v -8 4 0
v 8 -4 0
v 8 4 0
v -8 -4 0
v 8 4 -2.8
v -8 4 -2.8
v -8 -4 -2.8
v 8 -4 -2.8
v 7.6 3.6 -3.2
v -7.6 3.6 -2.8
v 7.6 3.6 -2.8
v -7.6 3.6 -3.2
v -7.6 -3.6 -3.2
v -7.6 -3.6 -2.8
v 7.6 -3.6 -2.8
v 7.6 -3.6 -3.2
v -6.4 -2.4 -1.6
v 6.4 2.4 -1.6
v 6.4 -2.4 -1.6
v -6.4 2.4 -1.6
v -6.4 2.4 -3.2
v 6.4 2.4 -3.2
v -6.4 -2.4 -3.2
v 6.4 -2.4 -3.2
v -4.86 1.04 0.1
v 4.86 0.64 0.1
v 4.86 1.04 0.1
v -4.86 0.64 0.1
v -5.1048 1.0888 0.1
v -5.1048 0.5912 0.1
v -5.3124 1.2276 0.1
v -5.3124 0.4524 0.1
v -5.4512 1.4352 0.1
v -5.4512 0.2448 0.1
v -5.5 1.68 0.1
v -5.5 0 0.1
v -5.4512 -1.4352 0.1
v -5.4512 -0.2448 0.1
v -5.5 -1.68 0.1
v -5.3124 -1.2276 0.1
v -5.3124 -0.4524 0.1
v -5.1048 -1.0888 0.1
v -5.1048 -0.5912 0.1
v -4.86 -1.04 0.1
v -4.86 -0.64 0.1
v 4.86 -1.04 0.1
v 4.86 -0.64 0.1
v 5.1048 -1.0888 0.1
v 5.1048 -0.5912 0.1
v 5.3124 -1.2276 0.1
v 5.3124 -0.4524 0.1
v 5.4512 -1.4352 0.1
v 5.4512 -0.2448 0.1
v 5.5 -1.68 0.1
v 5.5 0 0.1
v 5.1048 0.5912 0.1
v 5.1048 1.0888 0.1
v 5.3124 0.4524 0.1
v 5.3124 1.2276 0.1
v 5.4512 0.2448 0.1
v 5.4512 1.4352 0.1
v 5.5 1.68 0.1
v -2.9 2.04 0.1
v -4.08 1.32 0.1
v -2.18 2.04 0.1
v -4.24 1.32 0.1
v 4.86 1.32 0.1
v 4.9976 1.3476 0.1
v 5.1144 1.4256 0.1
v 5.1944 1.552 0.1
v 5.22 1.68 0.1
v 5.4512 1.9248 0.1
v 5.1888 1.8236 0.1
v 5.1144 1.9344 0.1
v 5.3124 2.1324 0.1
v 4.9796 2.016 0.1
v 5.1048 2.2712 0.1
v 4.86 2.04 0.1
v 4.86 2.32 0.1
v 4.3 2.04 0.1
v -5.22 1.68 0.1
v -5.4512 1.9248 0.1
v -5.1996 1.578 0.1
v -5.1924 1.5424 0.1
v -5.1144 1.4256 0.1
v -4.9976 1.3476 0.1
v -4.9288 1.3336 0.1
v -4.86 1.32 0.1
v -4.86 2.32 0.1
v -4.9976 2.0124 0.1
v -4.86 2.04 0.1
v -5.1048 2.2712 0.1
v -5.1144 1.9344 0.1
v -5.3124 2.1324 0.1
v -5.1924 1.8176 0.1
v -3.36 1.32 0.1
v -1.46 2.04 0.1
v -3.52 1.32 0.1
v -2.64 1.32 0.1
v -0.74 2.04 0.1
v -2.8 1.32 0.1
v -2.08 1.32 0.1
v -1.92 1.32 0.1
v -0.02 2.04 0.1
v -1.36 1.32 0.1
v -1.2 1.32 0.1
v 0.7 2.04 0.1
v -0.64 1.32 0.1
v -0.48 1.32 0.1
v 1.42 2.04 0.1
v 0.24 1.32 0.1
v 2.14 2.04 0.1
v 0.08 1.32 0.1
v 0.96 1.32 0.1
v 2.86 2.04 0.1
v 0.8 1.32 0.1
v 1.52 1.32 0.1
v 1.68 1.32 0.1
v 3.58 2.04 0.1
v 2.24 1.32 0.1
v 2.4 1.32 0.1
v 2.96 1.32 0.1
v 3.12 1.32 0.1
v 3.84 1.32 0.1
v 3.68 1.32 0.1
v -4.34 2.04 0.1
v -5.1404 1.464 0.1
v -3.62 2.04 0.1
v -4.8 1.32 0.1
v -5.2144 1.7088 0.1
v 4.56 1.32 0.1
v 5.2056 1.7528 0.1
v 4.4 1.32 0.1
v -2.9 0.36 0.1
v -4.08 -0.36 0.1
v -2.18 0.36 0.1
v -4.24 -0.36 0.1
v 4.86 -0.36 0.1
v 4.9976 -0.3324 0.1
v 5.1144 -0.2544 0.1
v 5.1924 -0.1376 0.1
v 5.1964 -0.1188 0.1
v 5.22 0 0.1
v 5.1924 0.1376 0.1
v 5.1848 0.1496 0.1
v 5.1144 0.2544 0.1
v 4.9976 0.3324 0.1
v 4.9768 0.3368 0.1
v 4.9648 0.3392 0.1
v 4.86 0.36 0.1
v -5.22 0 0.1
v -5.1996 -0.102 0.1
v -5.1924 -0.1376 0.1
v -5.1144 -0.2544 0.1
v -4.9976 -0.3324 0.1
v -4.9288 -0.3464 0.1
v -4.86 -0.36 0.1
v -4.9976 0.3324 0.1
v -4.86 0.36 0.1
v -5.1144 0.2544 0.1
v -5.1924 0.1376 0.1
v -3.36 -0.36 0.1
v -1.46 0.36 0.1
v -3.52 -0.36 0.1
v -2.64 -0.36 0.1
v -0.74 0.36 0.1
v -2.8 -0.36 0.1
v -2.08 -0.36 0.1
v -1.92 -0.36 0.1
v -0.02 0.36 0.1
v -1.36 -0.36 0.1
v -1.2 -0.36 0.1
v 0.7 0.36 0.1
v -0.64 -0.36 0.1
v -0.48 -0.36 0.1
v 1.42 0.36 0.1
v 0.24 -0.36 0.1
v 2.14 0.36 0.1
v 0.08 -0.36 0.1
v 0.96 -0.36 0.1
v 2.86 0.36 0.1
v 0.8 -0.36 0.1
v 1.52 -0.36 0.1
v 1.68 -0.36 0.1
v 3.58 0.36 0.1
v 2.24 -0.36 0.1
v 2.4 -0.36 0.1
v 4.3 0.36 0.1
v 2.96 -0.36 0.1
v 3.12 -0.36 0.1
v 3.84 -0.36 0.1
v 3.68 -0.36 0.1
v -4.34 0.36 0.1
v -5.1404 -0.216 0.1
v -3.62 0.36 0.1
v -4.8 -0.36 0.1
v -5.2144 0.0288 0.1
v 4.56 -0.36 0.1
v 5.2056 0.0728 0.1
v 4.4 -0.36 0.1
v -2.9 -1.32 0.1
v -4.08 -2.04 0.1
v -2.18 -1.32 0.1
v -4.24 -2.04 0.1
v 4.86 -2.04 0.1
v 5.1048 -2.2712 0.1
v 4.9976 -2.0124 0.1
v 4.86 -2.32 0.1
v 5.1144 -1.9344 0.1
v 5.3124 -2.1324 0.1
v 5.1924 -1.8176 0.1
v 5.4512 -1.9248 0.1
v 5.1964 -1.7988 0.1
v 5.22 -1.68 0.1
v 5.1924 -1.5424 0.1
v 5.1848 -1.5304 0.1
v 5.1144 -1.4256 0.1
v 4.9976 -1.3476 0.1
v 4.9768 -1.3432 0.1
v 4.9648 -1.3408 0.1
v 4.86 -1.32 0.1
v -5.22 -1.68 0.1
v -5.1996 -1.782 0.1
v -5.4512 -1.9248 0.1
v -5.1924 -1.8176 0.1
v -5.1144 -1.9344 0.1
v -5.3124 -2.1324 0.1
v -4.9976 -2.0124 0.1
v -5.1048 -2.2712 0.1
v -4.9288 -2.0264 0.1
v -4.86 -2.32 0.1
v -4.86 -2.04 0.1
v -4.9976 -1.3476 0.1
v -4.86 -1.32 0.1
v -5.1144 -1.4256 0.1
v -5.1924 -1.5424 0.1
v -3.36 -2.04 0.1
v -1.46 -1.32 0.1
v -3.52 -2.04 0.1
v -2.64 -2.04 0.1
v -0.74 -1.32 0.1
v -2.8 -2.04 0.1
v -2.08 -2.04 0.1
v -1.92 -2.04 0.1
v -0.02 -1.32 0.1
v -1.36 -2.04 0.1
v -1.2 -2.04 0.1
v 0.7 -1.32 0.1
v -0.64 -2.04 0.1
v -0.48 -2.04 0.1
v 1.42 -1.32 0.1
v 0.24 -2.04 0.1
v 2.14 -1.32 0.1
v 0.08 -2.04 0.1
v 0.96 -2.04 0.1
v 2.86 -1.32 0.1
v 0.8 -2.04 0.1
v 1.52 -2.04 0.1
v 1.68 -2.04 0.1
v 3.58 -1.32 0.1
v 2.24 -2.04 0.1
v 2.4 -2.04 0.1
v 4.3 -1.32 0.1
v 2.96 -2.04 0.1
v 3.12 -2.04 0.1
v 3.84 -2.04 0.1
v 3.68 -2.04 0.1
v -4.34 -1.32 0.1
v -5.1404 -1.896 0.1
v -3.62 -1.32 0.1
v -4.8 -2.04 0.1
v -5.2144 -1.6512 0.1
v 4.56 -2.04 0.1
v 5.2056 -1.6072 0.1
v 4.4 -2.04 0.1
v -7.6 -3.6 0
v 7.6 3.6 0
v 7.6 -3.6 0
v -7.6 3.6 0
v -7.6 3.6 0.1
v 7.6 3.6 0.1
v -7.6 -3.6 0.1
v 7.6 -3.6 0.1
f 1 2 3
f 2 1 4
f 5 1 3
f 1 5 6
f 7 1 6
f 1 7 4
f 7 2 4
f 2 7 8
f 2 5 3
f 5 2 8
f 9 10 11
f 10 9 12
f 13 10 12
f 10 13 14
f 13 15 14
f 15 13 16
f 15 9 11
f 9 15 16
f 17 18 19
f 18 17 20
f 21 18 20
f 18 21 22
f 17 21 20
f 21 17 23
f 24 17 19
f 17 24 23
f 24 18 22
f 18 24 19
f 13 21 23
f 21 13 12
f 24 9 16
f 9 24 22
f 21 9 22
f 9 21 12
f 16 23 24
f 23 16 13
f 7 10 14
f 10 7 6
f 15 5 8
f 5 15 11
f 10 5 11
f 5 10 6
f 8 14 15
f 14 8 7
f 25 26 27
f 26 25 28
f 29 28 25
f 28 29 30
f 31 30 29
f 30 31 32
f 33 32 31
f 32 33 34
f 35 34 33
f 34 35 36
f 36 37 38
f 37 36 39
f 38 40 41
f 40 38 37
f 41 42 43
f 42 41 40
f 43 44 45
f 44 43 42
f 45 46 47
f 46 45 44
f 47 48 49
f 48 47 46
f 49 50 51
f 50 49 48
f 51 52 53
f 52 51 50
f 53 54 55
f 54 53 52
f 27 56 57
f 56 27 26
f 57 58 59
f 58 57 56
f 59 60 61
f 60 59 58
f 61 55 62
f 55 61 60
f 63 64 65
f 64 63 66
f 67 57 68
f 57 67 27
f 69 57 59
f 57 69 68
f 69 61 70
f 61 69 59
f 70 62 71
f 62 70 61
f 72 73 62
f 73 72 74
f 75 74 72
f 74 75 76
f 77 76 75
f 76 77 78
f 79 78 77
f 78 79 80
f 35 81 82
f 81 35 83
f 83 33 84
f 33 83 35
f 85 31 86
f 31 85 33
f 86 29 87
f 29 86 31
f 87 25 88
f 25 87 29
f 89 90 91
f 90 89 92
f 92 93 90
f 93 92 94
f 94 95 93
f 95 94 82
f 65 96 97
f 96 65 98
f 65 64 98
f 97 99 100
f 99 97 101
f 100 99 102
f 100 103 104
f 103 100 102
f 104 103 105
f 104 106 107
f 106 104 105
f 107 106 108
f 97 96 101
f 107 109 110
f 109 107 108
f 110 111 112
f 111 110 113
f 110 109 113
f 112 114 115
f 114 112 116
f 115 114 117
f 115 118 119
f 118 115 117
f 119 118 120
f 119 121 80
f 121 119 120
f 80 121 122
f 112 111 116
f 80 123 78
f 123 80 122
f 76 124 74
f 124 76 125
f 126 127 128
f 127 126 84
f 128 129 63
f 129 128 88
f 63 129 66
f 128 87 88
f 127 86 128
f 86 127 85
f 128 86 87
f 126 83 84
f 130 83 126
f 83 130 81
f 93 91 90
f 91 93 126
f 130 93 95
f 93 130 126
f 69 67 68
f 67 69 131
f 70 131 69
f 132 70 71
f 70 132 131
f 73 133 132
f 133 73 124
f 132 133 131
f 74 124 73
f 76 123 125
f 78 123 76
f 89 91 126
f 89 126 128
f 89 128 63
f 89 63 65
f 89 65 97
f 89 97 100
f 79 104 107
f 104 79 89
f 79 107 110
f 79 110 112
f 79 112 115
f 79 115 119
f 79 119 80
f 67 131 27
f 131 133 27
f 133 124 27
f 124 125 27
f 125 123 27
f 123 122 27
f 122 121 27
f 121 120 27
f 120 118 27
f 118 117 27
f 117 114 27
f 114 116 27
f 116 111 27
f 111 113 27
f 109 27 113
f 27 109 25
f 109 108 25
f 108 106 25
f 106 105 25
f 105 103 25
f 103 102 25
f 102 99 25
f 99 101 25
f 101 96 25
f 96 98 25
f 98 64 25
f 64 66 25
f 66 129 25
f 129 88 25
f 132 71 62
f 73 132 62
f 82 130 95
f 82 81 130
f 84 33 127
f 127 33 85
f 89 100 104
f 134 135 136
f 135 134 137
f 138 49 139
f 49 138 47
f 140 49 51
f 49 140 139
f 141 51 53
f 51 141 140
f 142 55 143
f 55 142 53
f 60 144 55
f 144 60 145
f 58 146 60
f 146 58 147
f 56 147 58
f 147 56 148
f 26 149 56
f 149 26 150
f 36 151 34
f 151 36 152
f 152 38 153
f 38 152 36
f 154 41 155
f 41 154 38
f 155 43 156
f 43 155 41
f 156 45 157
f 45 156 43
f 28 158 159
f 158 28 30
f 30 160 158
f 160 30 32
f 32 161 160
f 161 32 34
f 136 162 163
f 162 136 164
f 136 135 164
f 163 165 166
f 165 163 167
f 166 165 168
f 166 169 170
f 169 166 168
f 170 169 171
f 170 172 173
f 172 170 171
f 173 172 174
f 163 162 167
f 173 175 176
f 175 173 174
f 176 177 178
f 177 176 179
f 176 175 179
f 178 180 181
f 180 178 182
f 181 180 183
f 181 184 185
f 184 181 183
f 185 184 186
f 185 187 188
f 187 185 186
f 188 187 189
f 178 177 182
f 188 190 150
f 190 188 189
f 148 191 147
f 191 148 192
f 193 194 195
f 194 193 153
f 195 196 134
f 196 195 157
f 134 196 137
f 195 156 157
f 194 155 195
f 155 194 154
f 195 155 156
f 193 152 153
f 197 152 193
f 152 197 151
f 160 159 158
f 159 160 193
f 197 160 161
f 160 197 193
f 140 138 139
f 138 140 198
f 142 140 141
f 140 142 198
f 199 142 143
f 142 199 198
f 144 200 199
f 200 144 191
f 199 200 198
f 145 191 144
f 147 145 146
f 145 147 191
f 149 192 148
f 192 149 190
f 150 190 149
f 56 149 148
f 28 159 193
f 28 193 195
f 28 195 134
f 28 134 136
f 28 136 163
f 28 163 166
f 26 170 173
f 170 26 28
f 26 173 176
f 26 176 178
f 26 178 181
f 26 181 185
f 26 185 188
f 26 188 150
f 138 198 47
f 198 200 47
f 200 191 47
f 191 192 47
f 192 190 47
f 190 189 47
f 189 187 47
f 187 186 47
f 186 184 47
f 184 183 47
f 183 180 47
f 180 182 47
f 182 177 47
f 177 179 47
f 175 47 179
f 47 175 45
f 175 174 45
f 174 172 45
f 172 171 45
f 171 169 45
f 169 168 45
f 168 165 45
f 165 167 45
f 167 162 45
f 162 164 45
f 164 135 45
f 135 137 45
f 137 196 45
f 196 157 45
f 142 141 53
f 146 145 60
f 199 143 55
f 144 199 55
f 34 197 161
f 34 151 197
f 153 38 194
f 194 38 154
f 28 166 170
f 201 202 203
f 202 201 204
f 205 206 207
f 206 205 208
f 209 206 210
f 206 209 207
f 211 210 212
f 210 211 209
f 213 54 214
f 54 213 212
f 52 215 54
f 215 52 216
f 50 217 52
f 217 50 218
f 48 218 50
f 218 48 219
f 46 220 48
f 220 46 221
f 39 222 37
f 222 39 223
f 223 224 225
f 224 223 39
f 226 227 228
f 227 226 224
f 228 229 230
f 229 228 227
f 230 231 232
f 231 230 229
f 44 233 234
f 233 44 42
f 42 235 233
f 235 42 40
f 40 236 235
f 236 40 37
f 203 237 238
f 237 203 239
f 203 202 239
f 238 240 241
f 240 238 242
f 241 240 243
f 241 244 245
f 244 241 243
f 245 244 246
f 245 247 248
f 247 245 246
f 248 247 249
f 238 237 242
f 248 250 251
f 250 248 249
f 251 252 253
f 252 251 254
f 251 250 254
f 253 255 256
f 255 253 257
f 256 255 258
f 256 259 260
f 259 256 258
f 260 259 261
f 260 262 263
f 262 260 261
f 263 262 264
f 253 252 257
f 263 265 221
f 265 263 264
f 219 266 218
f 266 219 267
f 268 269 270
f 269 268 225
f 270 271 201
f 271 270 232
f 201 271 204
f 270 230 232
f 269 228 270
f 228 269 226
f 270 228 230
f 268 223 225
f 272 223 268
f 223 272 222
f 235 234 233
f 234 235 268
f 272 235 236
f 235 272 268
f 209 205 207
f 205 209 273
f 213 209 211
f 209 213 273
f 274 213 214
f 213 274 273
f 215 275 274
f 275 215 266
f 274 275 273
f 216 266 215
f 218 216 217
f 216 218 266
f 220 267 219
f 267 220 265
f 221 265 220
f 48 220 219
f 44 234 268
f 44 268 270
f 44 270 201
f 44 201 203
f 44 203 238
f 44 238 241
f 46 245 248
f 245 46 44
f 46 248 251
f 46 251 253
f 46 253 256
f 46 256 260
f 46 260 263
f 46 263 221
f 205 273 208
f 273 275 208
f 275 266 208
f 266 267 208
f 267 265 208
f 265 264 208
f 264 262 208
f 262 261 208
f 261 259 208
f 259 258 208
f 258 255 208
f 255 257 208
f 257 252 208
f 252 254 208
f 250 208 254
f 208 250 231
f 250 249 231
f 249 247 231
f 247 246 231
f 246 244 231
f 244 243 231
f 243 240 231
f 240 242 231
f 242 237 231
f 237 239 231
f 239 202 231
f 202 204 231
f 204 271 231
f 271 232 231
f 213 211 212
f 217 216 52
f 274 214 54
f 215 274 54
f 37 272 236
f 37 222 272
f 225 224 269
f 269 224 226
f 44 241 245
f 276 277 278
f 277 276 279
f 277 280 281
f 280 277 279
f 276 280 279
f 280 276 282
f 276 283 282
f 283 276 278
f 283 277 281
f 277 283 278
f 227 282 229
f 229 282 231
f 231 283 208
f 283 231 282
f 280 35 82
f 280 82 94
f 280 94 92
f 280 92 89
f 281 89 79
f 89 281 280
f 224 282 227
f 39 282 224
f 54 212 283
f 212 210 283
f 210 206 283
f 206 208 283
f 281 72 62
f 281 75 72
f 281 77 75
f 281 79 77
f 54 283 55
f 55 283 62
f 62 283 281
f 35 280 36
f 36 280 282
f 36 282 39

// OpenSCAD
// file: ../p/box5.scad
use <../lib.scad>
function ldraw_lib__box5() = [
// 0 Box with 5 Faces and All Edges
// 0 Name: box5.dat
// 0 Author: James Jessiman
// 0 !LDRAW_ORG Primitive UPDATE 2012-01
// 0 !LICENSE Licensed under CC BY 4.0 : see CAreadme.txt
// 
// 0 BFC CERTIFY CCW
  [0,"BFC","CERTIFY"],
  [0,"BFC","CCW"],
// 
// 0 !HISTORY 2002-04-03 [sbliss] Modified for BFC compliance
// 0 !HISTORY 2002-04-25 [PTadmin] Official Update 2002-02
// 0 !HISTORY 2007-06-24 [PTadmin] Header formatted for Contributor Agreement
// 0 !HISTORY 2008-07-01 [PTadmin] Official Update 2008-01
// 0 !HISTORY 2012-02-16 [Philo] Changed to CCW
// 0 !HISTORY 2012-03-30 [PTadmin] Official Update 2012-01
// 
// 
// 2 24 1 1 1 -1 1 1
  [2,24,1,1,1,-1,1,1],
// 2 24 -1 1 1 -1 1 -1
  [2,24,-1,1,1,-1,1,-1],
// 2 24 -1 1 -1 1 1 -1
  [2,24,-1,1,-1,1,1,-1],
// 2 24 1 1 -1 1 1 1
  [2,24,1,1,-1,1,1,1],
// 2 24 1 0 1 -1 0 1
  [2,24,1,0,1,-1,0,1],
// 2 24 -1 0 1 -1 0 -1
  [2,24,-1,0,1,-1,0,-1],
// 2 24 -1 0 -1 1 0 -1
  [2,24,-1,0,-1,1,0,-1],
// 2 24 1 0 -1 1 0 1
  [2,24,1,0,-1,1,0,1],
// 2 24 1 0 1 1 1 1
  [2,24,1,0,1,1,1,1],
// 2 24 -1 0 1 -1 1 1
  [2,24,-1,0,1,-1,1,1],
// 2 24 1 0 -1 1 1 -1
  [2,24,1,0,-1,1,1,-1],
// 2 24 -1 0 -1 -1 1 -1
  [2,24,-1,0,-1,-1,1,-1],
// 4 16 -1 1 1 1 1 1 1 1 -1 -1 1 -1
  [4,16,-1,1,1,1,1,1,1,1,-1,-1,1,-1],
// 4 16 -1 1 1 -1 0 1 1 0 1 1 1 1
  [4,16,-1,1,1,-1,0,1,1,0,1,1,1,1],
// 4 16 -1 1 -1 -1 0 -1 -1 0 1 -1 1 1
  [4,16,-1,1,-1,-1,0,-1,-1,0,1,-1,1,1],
// 4 16 1 1 -1 1 0 -1 -1 0 -1 -1 1 -1
  [4,16,1,1,-1,1,0,-1,-1,0,-1,-1,1,-1],
// 4 16 1 1 1 1 0 1 1 0 -1 1 1 -1
  [4,16,1,1,1,1,0,1,1,0,-1,1,1,-1],
];
module ldraw_lib__box5(step=0, col=false, unit=2/5, alt=false, line=0.2, solid=!$preview)
    makepoly(ldraw_lib__box5(), step=step, col=col, unit=unit, alt=alt, line=line, solid=solid);
ldraw_lib__box5(line=0.2);
// file: ../p/box4.scad
use <../lib.scad>
function ldraw_lib__box4() = [
// 0 Box with 4 Faces (2 Parallel Pairs) and All Edges
// 0 Name: box4.dat
// 0 Author: James Jessiman
// 0 !LDRAW_ORG Primitive UPDATE 2012-01
// 0 !LICENSE Licensed under CC BY 4.0 : see CAreadme.txt
// 
// 0 BFC CERTIFY CCW
  [0,"BFC","CERTIFY"],
  [0,"BFC","CCW"],
// 
// 0 !HISTORY 2002-04-03 [sbliss] Modified for BFC compliance
// 0 !HISTORY 2002-04-25 [PTadmin] Official Update 2002-02
// 0 !HISTORY 2007-06-24 [PTadmin] Header formatted for Contributor Agreement
// 0 !HISTORY 2008-07-01 [PTadmin] Official Update 2008-01
// 0 !HISTORY 2012-02-16 [Philo] Changed to CCW
// 0 !HISTORY 2012-03-30 [PTadmin] Official Update 2012-01
// 
// 
// 2 24 1 1 1 -1 1 1
  [2,24,1,1,1,-1,1,1],
// 2 24 -1 1 1 -1 1 -1
  [2,24,-1,1,1,-1,1,-1],
// 2 24 -1 1 -1 1 1 -1
  [2,24,-1,1,-1,1,1,-1],
// 2 24 1 1 -1 1 1 1
  [2,24,1,1,-1,1,1,1],
// 2 24 1 0 1 -1 0 1
  [2,24,1,0,1,-1,0,1],
// 2 24 -1 0 1 -1 0 -1
  [2,24,-1,0,1,-1,0,-1],
// 2 24 -1 0 -1 1 0 -1
  [2,24,-1,0,-1,1,0,-1],
// 2 24 1 0 -1 1 0 1
  [2,24,1,0,-1,1,0,1],
// 2 24 1 0 1 1 1 1
  [2,24,1,0,1,1,1,1],
// 2 24 -1 0 1 -1 1 1
  [2,24,-1,0,1,-1,1,1],
// 2 24 1 0 -1 1 1 -1
  [2,24,1,0,-1,1,1,-1],
// 2 24 -1 0 -1 -1 1 -1
  [2,24,-1,0,-1,-1,1,-1],
// 4 16 -1 1 1 -1 0 1 1 0 1 1 1 1
  [4,16,-1,1,1,-1,0,1,1,0,1,1,1,1],
// 4 16 -1 1 -1 -1 0 -1 -1 0 1 -1 1 1
  [4,16,-1,1,-1,-1,0,-1,-1,0,1,-1,1,1],
// 4 16 1 1 -1 1 0 -1 -1 0 -1 -1 1 -1
  [4,16,1,1,-1,1,0,-1,-1,0,-1,-1,1,-1],
// 4 16 1 1 1 1 0 1 1 0 -1 1 1 -1
  [4,16,1,1,1,1,0,1,1,0,-1,1,1,-1],
];
module ldraw_lib__box4(step=0, col=false, unit=2/5, alt=false, line=0.2, solid=!$preview)
    makepoly(ldraw_lib__box4(), step=step, col=col, unit=unit, alt=alt, line=line, solid=solid);
ldraw_lib__box4(line=0.2);
// file: ../p/box5-12.scad
use <../lib.scad>
function ldraw_lib__box5_12() = [
// 0 Box with 5 Faces without Any Edges
// 0 Name: box5-12.dat
// 0 Author: Chris Dee [cwdee]
// 0 !LDRAW_ORG Primitive UPDATE 2009-02
// 0 !LICENSE Licensed under CC BY 4.0 : see CAreadme.txt
// 
// 0 BFC CERTIFY CCW
  [0,"BFC","CERTIFY"],
  [0,"BFC","CCW"],
// 
// 0 !HISTORY 2009-09-03 [PTadmin] Official Update 2009-02
// 
// 
// 4 16 1 1 1 1 1 -1 -1 1 -1 -1 1 1
  [4,16,1,1,1,1,1,-1,-1,1,-1,-1,1,1],
// 4 16 -1 0 1 1 0 1 1 1 1 -1 1 1
  [4,16,-1,0,1,1,0,1,1,1,1,-1,1,1],
// 4 16 -1 0 -1 -1 0 1 -1 1 1 -1 1 -1
  [4,16,-1,0,-1,-1,0,1,-1,1,1,-1,1,-1],
// 4 16 1 0 -1 -1 0 -1 -1 1 -1 1 1 -1
  [4,16,1,0,-1,-1,0,-1,-1,1,-1,1,1,-1],
// 4 16 1 0 1 1 0 -1 1 1 -1 1 1 1
  [4,16,1,0,1,1,0,-1,1,1,-1,1,1,1],
// 0
];
module ldraw_lib__box5_12(step=0, col=false, unit=2/5, alt=false, line=0.2, solid=!$preview)
    makepoly(ldraw_lib__box5_12(), step=step, col=col, unit=unit, alt=alt, line=line, solid=solid);
ldraw_lib__box5_12(line=0.2);
// file: s/3069bs01.scad
use <../../lib.scad>
use <../../p/box4.scad>
use <../../p/box5.scad>
function ldraw_lib__s__3069bs01() = [
// 0 ~Tile  1 x  2 with Groove without Top Face
// 0 Name: s\3069bs01.dat
// 0 Author: Santeri Piippo [arezey]
// 0 !LDRAW_ORG Subpart UPDATE 2010-02
// 0 !LICENSE Licensed under CC BY 4.0 : see CAreadme.txt
// 
// 0 BFC CERTIFY CCW
  [0,"BFC","CERTIFY"],
  [0,"BFC","CCW"],
// 
// 0 !HISTORY 2010-07-05 [PTadmin] Official Update 2010-02
// 
// 
// 1 16 0 0 0 20 0 0 0 7 0 0 0 10 box4.dat
  [1,16,0,0,0,20,0,0,0,7,0,0,0,10, ldraw_lib__box4()],
// 1 16 0 7 0 19 0 0 0 1 0 0 0 9 box4.dat
  [1,16,0,7,0,19,0,0,0,1,0,0,0,9, ldraw_lib__box4()],
// 0 BFC INVERTNEXT
  [0,"BFC","INVERTNEXT"],
// 1 16 0 8 0 16 0 0 0 -4 0 0 0 6 box5.dat
  [1,16,0,8,0,16,0,0,0,-4,0,0,0,6, ldraw_lib__box5()],
// 4 16 -19 8 9 -16 8 6 -16 8 -6 -19 8 -9
  [4,16,-19,8,9,-16,8,6,-16,8,-6,-19,8,-9],
// 4 16 19 8 -9 16 8 -6 16 8 6 19 8 9
  [4,16,19,8,-9,16,8,-6,16,8,6,19,8,9],
// 4 16 19 8 9 16 8 6 -16 8 6 -19 8 9
  [4,16,19,8,9,16,8,6,-16,8,6,-19,8,9],
// 4 16 -19 8 -9 -16 8 -6 16 8 -6 19 8 -9
  [4,16,-19,8,-9,-16,8,-6,16,8,-6,19,8,-9],
// 4 16 -20 7 10 -19 7 9 -19 7 -9 -20 7 -10
  [4,16,-20,7,10,-19,7,9,-19,7,-9,-20,7,-10],
// 4 16 20 7 -10 19 7 -9 19 7 9 20 7 10
  [4,16,20,7,-10,19,7,-9,19,7,9,20,7,10],
// 4 16 20 7 10 19 7 9 -19 7 9 -20 7 10
  [4,16,20,7,10,19,7,9,-19,7,9,-20,7,10],
// 4 16 -20 7 -10 -19 7 -9 19 7 -9 20 7 -10
  [4,16,-20,7,-10,-19,7,-9,19,7,-9,20,7,-10],
// 0 //
];
module ldraw_lib__s__3069bs01(step=0, col=false, unit=2/5, alt=false, line=0.2, solid=!$preview)
    makepoly(ldraw_lib__s__3069bs01(), step=step, col=col, unit=unit, alt=alt, line=line, solid=solid);
ldraw_lib__s__3069bs01(line=0.2);
// file: 4263304f.scad
use <../lib.scad>
use <../p/box5-12.scad>
use <s/4188571cs01.scad>
function ldraw_lib__4263304f() = [
// 0 Sticker  0.9 x  1.9 with Horizontal Grille
// 0 Name: 4263304f.dat
// 0 Author: Gerald Lasser [GeraldLasser]
// 0 !LDRAW_ORG Part UPDATE 2023-04
// 0 !LICENSE Licensed under CC BY 4.0 : see CAreadme.txt
// 
// 0 BFC CERTIFY CCW
  [0,"BFC","CERTIFY"],
  [0,"BFC","CCW"],
// 
// 0 !KEYWORDS BNSF, Bricklink 10133stk01, Brickowl 912944, Rebrickable 53049
// 0 !KEYWORDS Sante Fe, Set 10133
// 
// 0 !HISTORY 2023-08-25 [OrionP] Official Update 2023-04
// 
// 
// 1 16 0 -.25 0 1 0 0 0 1 0 0 0 1 s\4188571cs01.dat
  [1,16,0,-.25,0,1,0,0,0,1,0,0,0,1, ldraw_lib__s__4188571cs01()],
// 
// 1 16 0 -0.25 0 19 0 0 0 0.25 0 0 0 9 box5-12.dat
  [1,16,0,-0.25,0,19,0,0,0,0.25,0,0,0,9, ldraw_lib__box5_12()],
// 
// 3 16 -13.281 -.25 -5.331 -19 -.25 -9 -12.762 -.25 -5.678
  [3,16,-13.281,-.25,-5.331,-19,-.25,-9,-12.762,-.25,-5.678],
// 3 16 -12.762 -.25 -5.678 -19 -.25 -9 -12.15 -.25 -5.8
  [3,16,-12.762,-.25,-5.678,-19,-.25,-9,-12.15,-.25,-5.8],
// 4 16 12.15 -.25 -5.8 -12.15 -.25 -5.8 -19 -.25 -9 19 -.25 -9
  [4,16,12.15,-.25,-5.8,-12.15,-.25,-5.8,-19,-.25,-9,19,-.25,-9],
// 3 16 -19 -.25 9 -13.75 -.25 4.2 -13.628 -.25 4.812
  [3,16,-19,-.25,9,-13.75,-.25,4.2,-13.628,-.25,4.812],
// 3 16 -19 -.25 9 -13.628 -.25 4.812 -13.281 -.25 5.331
  [3,16,-19,-.25,9,-13.628,-.25,4.812,-13.281,-.25,5.331],
// 3 16 -19 -.25 9 -13.281 -.25 5.331 -12.762 -.25 5.678
  [3,16,-19,-.25,9,-13.281,-.25,5.331,-12.762,-.25,5.678],
// 3 16 -19 -.25 9 -12.762 -.25 5.678 -12.15 -.25 5.8
  [3,16,-19,-.25,9,-12.762,-.25,5.678,-12.15,-.25,5.8],
// 4 16 -19 -.25 9 -12.15 -.25 5.8 12.15 -.25 5.8 19 -.25 9
  [4,16,-19,-.25,9,-12.15,-.25,5.8,12.15,-.25,5.8,19,-.25,9],
// 3 16 -13.628 -.25 -4.812 -19 -.25 -9 -13.281 -.25 -5.331
  [3,16,-13.628,-.25,-4.812,-19,-.25,-9,-13.281,-.25,-5.331],
// 3 16 -13.75 -.25 -4.2 -19 -.25 -9 -13.628 -.25 -4.812
  [3,16,-13.75,-.25,-4.2,-19,-.25,-9,-13.628,-.25,-4.812],
// 3 16 13.75 -.25 -4.2 13.628 -.25 -4.812 19 -.25 -9
  [3,16,13.75,-.25,-4.2,13.628,-.25,-4.812,19,-.25,-9],
// 3 16 13.628 -.25 -4.812 13.281 -.25 -5.331 19 -.25 -9
  [3,16,13.628,-.25,-4.812,13.281,-.25,-5.331,19,-.25,-9],
// 3 16 13.281 -.25 -5.331 12.762 -.25 -5.678 19 -.25 -9
  [3,16,13.281,-.25,-5.331,12.762,-.25,-5.678,19,-.25,-9],
// 3 16 12.762 -.25 -5.678 12.15 -.25 -5.8 19 -.25 -9
  [3,16,12.762,-.25,-5.678,12.15,-.25,-5.8,19,-.25,-9],
// 3 16 19 -.25 9 13.628 -.25 4.812 13.75 -.25 4.2
  [3,16,19,-.25,9,13.628,-.25,4.812,13.75,-.25,4.2],
// 3 16 19 -.25 9 13.281 -.25 5.331 13.628 -.25 4.812
  [3,16,19,-.25,9,13.281,-.25,5.331,13.628,-.25,4.812],
// 3 16 19 -.25 9 12.762 -.25 5.678 13.281 -.25 5.331
  [3,16,19,-.25,9,12.762,-.25,5.678,13.281,-.25,5.331],
// 3 16 19 -.25 9 12.15 -.25 5.8 12.762 -.25 5.678
  [3,16,19,-.25,9,12.15,-.25,5.8,12.762,-.25,5.678],
// 3 16 13.75 -.25 -4.2 19 -.25 -9 13.75 -.25 0
  [3,16,13.75,-.25,-4.2,19,-.25,-9,13.75,-.25,0],
// 3 16 13.75 -.25 0 19 -.25 -9 13.75 -.25 4.2
  [3,16,13.75,-.25,0,19,-.25,-9,13.75,-.25,4.2],
// 3 16 13.75 -.25 4.2 19 -.25 -9 19 -.25 9
  [3,16,13.75,-.25,4.2,19,-.25,-9,19,-.25,9],
// 3 16 -13.75 -.25 4.2 -19 -.25 9 -13.75 -.25 0
  [3,16,-13.75,-.25,4.2,-19,-.25,9,-13.75,-.25,0],
// 3 16 -13.75 -.25 0 -19 -.25 9 -19 -.25 -9
  [3,16,-13.75,-.25,0,-19,-.25,9,-19,-.25,-9],
// 3 16 -13.75 -.25 0 -19 -.25 -9 -13.75 -.25 -4.2
  [3,16,-13.75,-.25,0,-19,-.25,-9,-13.75,-.25,-4.2],
];
module ldraw_lib__4263304f(step=0, col=false, unit=2/5, alt=false, line=0.2, solid=!$preview)
    makepoly(ldraw_lib__4263304f(), step=step, col=col, unit=unit, alt=alt, line=line, solid=solid);
ldraw_lib__4263304f(line=0.2);
// file: 3069b.scad
use <../lib.scad>
use <s/3069bs01.scad>
function ldraw_lib__3069b() = [
// 0 Tile  1 x  2 with Groove
// 0 Name: 3069b.dat
// 0 Author: Santeri Piippo [arezey]
// 0 !LDRAW_ORG Part UPDATE 2010-02
// 0 !LICENSE Licensed under CC BY 4.0 : see CAreadme.txt
// 
// 0 BFC CERTIFY CCW
  [0,"BFC","CERTIFY"],
  [0,"BFC","CCW"],
// 
// 0 !KEYWORDS BrickLink 3069
// 
// 0 !HISTORY 2010-07-05 [PTadmin] Official Update 2010-02
// 
// 
// 4 16 20 0 -10 20 0 10 -20 0 10 -20 0 -10
  [4,16,20,0,-10,20,0,10,-20,0,10,-20,0,-10],
// 1 16 0 0 0 1 0 0 0 1 0 0 0 1 s\3069bs01.dat
  [1,16,0,0,0,1,0,0,0,1,0,0,0,1, ldraw_lib__s__3069bs01()],
// 0 //
];
module ldraw_lib__3069b(step=0, col=false, unit=2/5, alt=false, line=0.2, solid=!$preview)
    makepoly(ldraw_lib__3069b(), step=step, col=col, unit=unit, alt=alt, line=line, solid=solid);
ldraw_lib__3069b(line=0.2);
// main file
use <../lib.scad>
use <3069b.scad>
use <4263304f.scad>
function ldraw_lib__3069bd1l() = [
// 0 Tile  1 x  2 with Horizontal Grille Sticker
// 0 Name: 3069bd1l.dat
// 0 Author: Vincent Messenet [Cheenzo]
// 0 !LDRAW_ORG Shortcut UPDATE 2025-05
// 0 !LICENSE Licensed under CC BY 4.0 : see CAreadme.txt
// 
// 0 BFC CERTIFY CCW
  [0,"BFC","CERTIFY"],
  [0,"BFC","CCW"],
// 
// 0 !CATEGORY Sticker Shortcut
// 0 !KEYWORDS Bricklink 3069pb0151, Set 10133
// 
// 0 !HISTORY 2025-05-28 [OrionP] Official Update 2025-05
// 
// 1 16 0 0 0 1 0 0 0 1 0 0 0 1 3069b.dat
  [1,16,0,0,0,1,0,0,0,1,0,0,0,1, ldraw_lib__3069b()],
// 1 16 0 0 0 1 0 0 0 1 0 0 0 1 4263304f.dat
  [1,16,0,0,0,1,0,0,0,1,0,0,0,1, ldraw_lib__4263304f()],
];
module ldraw_lib__3069bd1l(step=0, col=false, unit=2/5, alt=false, line=0.2, solid=!$preview)
    makepoly(ldraw_lib__3069bd1l(), step=step, col=col, unit=unit, alt=alt, line=line, solid=solid);
ldraw_lib__3069bd1l(line=0.2);
